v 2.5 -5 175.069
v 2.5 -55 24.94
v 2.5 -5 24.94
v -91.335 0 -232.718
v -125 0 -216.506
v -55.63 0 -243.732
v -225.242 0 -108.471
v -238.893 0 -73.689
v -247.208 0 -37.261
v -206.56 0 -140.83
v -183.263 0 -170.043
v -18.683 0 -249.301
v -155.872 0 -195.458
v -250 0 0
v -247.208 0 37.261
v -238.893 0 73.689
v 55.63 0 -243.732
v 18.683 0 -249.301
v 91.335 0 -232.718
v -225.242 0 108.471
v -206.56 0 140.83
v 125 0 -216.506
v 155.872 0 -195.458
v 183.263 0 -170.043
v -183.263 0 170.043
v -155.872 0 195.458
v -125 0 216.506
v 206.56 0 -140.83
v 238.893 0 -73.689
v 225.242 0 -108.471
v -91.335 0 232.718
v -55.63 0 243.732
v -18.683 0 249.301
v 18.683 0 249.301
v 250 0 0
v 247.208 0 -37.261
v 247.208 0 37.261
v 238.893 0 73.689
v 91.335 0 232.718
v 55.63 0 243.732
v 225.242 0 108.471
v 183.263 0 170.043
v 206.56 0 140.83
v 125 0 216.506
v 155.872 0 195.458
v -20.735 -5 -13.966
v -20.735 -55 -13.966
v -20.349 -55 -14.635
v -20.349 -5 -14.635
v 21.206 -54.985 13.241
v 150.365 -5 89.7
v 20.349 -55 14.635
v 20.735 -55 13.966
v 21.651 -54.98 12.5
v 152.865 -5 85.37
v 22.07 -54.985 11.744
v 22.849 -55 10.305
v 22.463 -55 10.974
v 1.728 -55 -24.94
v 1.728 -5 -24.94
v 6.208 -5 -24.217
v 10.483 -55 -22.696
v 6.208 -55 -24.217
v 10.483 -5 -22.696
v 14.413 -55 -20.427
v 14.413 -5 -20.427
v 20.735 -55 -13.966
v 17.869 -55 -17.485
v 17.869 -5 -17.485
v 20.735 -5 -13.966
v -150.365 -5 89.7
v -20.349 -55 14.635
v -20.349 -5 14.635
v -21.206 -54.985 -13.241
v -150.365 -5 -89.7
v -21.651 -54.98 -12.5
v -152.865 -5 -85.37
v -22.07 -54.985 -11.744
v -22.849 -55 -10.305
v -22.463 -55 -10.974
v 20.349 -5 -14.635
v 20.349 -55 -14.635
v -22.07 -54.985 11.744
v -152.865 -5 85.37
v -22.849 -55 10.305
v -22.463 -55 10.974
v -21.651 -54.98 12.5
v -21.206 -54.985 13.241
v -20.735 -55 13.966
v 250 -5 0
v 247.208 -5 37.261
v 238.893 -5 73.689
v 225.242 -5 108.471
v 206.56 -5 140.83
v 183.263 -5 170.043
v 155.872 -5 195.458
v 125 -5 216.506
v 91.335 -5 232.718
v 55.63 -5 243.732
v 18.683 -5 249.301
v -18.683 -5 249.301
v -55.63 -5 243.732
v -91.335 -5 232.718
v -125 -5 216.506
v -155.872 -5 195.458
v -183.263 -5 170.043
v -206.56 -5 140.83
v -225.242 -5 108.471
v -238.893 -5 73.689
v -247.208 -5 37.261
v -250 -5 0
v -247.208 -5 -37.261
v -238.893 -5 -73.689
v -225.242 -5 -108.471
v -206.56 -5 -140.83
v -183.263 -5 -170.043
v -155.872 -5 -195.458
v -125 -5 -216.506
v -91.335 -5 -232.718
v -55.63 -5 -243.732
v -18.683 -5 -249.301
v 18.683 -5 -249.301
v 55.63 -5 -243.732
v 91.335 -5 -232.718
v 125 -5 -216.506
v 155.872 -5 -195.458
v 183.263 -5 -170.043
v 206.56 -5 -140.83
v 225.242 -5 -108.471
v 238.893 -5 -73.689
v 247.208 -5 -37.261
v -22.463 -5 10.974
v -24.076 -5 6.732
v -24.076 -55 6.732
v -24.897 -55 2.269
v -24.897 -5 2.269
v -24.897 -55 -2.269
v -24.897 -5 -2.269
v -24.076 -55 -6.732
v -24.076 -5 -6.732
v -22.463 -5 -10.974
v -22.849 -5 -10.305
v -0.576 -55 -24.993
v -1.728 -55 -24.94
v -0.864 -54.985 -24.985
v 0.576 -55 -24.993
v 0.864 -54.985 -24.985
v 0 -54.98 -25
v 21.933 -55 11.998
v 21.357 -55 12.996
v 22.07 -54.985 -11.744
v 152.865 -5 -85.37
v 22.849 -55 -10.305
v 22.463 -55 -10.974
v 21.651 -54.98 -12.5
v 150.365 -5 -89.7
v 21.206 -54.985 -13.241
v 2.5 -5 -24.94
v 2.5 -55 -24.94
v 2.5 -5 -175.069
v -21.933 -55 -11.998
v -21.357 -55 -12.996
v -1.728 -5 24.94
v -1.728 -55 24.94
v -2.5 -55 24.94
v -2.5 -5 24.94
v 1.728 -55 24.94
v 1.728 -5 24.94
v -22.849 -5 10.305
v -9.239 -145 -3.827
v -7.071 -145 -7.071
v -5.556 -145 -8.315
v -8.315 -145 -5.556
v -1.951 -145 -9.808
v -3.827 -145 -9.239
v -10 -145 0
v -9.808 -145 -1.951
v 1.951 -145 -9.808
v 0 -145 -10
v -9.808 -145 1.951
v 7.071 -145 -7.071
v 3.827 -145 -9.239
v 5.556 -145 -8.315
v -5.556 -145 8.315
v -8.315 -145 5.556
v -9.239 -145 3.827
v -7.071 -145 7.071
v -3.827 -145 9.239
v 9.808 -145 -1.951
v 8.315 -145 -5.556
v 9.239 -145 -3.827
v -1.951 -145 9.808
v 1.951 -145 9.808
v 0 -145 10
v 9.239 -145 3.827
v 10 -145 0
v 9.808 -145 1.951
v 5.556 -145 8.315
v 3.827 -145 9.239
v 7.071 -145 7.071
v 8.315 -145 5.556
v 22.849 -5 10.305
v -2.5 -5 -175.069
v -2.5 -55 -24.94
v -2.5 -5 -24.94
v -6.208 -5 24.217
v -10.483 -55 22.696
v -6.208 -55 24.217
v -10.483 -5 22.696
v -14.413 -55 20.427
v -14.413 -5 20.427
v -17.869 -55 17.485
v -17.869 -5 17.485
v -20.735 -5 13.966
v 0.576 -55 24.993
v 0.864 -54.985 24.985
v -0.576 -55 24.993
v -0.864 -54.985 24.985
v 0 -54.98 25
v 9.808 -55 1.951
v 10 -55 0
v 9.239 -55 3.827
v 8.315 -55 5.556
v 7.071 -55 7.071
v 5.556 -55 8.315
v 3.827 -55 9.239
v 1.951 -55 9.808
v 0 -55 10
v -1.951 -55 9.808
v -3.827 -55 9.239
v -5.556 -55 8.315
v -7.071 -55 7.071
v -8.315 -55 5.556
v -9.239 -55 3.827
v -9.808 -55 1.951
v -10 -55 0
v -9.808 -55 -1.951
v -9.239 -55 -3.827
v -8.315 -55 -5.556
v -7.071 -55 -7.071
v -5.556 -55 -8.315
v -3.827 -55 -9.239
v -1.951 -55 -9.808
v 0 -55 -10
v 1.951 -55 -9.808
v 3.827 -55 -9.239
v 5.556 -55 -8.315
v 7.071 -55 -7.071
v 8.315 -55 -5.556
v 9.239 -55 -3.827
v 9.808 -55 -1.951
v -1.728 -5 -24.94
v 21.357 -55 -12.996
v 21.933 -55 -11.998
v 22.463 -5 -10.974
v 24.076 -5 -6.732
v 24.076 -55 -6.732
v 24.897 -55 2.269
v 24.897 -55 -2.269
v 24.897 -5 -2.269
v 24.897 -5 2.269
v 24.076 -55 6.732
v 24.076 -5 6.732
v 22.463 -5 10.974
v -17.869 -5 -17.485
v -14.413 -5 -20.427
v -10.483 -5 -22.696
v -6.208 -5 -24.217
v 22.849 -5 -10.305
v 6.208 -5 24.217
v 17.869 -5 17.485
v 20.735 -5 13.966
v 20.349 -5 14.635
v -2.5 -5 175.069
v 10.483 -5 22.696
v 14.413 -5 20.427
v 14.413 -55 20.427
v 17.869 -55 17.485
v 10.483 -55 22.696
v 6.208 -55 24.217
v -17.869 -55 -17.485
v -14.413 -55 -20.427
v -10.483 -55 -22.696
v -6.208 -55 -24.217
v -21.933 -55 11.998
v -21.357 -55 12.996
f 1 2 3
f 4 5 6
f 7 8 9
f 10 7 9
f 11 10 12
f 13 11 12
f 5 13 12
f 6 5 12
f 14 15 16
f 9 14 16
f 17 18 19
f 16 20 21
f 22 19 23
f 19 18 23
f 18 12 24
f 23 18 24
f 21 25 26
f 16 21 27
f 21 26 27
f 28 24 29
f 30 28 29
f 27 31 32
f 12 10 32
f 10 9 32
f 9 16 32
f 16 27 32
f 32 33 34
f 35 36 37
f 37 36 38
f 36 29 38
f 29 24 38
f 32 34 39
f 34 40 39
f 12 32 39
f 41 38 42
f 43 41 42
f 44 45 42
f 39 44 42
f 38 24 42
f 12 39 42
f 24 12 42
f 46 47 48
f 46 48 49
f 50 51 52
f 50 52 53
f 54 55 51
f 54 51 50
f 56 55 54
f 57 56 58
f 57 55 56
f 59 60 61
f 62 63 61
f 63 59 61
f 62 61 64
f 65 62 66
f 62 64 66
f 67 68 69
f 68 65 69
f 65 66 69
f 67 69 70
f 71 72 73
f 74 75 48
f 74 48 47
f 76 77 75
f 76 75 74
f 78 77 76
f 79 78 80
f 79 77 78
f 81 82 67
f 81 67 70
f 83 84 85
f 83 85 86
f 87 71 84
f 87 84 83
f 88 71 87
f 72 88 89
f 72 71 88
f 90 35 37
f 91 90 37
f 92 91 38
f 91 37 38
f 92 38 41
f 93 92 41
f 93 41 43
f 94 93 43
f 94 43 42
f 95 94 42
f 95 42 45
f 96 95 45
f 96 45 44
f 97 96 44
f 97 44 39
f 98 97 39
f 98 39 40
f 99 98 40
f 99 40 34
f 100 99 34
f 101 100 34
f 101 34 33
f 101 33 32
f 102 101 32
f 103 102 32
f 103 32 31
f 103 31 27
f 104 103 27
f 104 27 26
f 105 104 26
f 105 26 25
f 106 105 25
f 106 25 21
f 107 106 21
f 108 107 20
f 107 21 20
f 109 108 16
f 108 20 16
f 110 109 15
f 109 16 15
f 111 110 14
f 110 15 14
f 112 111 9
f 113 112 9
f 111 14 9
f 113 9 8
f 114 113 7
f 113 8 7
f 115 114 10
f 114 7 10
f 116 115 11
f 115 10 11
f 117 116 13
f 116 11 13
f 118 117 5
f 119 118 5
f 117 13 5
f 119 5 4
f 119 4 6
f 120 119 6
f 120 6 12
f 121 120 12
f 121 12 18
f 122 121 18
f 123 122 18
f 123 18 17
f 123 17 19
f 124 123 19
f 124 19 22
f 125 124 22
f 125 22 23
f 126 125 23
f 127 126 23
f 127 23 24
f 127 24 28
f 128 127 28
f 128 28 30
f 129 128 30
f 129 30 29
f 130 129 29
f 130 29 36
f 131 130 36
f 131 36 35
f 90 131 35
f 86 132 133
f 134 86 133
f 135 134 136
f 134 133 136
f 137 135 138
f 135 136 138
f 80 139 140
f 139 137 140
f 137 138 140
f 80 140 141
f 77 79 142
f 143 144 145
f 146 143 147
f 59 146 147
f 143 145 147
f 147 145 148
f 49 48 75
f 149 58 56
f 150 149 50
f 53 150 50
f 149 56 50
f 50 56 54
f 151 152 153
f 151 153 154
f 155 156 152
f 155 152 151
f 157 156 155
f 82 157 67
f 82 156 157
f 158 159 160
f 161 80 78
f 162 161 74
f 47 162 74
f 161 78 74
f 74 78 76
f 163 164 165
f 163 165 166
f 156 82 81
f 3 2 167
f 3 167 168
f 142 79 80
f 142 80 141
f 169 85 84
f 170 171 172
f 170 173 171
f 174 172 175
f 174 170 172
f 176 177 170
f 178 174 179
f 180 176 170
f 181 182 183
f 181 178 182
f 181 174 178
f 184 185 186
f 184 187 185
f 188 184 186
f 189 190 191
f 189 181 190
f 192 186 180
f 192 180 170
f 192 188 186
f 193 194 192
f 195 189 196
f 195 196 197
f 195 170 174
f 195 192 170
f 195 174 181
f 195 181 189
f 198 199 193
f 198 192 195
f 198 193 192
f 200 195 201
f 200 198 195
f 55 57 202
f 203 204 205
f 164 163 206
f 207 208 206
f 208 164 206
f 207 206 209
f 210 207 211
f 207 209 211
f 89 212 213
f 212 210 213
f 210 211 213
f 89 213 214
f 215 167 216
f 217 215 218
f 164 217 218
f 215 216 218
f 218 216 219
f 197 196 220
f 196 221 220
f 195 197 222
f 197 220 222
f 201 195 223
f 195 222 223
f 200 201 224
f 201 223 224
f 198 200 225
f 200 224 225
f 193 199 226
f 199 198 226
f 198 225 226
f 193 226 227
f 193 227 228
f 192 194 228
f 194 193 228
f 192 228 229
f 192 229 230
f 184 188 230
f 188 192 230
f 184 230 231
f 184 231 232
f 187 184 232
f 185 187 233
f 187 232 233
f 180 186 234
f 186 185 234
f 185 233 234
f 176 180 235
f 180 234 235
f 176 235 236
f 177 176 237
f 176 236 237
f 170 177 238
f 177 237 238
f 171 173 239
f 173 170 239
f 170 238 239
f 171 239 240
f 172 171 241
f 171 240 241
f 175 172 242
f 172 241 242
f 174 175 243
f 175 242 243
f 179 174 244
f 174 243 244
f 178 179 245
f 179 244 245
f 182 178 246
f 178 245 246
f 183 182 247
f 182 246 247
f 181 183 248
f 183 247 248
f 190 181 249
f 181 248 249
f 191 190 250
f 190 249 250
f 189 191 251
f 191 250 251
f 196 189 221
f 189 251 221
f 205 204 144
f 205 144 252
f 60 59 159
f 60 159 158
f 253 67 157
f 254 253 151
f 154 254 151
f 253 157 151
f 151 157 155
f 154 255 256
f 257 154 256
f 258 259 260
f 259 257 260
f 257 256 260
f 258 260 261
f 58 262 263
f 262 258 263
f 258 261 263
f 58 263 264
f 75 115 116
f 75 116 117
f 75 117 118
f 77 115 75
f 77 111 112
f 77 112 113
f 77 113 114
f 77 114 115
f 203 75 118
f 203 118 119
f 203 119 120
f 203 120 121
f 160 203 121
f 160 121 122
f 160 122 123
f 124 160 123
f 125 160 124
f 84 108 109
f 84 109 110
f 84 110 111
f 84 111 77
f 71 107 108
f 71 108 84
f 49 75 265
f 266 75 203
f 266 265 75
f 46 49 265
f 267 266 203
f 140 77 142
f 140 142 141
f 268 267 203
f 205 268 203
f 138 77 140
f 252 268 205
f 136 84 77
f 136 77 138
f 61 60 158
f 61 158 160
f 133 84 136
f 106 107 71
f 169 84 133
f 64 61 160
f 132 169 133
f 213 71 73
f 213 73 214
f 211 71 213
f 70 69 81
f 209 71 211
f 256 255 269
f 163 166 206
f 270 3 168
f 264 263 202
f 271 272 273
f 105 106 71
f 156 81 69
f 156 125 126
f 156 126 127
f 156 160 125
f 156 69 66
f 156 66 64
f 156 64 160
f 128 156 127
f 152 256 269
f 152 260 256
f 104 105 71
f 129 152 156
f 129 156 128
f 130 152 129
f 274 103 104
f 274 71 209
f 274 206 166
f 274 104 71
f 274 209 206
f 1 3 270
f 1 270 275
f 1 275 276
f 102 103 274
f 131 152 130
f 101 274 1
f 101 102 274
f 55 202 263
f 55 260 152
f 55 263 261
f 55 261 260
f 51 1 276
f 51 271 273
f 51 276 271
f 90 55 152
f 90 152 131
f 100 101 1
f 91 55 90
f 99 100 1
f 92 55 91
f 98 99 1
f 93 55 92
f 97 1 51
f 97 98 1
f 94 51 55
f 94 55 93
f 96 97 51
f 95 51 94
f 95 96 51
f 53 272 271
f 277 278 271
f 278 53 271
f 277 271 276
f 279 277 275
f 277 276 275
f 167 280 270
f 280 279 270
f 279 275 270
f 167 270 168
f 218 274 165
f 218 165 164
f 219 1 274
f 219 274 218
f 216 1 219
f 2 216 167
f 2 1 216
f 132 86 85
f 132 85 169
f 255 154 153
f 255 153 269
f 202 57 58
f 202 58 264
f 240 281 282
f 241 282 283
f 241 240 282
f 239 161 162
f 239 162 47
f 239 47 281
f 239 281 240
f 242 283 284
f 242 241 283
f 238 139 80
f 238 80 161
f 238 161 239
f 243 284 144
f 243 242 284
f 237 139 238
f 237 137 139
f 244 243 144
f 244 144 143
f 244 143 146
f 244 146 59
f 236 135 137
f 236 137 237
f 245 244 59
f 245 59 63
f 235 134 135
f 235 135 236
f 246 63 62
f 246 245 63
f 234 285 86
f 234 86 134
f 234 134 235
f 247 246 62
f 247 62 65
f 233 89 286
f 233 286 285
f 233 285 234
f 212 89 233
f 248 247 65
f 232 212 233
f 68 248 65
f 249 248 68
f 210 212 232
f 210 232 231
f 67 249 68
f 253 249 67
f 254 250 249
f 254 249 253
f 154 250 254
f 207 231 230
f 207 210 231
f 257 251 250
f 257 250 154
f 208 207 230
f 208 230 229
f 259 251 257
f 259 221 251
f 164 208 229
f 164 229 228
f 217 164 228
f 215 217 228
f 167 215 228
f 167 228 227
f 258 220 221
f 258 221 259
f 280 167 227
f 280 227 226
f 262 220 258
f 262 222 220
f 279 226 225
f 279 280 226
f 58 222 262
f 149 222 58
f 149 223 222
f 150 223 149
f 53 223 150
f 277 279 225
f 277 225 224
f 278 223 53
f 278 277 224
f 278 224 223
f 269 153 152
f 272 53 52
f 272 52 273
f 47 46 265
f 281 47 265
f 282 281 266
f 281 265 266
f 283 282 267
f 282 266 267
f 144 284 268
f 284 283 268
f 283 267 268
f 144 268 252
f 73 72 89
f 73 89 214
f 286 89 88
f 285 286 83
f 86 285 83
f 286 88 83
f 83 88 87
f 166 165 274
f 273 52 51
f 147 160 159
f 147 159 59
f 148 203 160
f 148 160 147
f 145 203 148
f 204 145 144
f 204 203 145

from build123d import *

# Parameters (mm, degrees)
F0_R     = 250
F1_DEPTH = 5
F2_R     = 25
F3_DEPTH = 50
F4_R     = 10
F5_DEPTH = 90
F7_DEPTH = 2.5
F8_COUNT = 6


with BuildPart() as f1:
    # F0 (on Front) → F1 (new body)
    with BuildSketch(Plane.XZ):
        Circle(F0_R)
    extrude(amount=F1_DEPTH)

    # F2 (on face) → F3 (join)
    with BuildSketch(Plane.XZ.offset(5)):
        Circle(F2_R)
    extrude(amount=F3_DEPTH)

    # F4 (on face) → F5 (join)
    with BuildSketch(Plane.XZ.offset(55)):
        Circle(F4_R)
    extrude(amount=F5_DEPTH)

    # F6 (on Right) → F7 (join, symmetric)
    with BuildSketch(Plane.YZ):
        Polygon((-5, 175.0694811344), (-55, 24.9402336776), (-5, 24.9402336776), align=None)
    extrude(amount=F7_DEPTH, both=True)

    # F8: F1 ×6 about axis
    f8_axis = Axis((0, -55, 0), (0, -1, 0))


with BuildPart() as f1_1:
    add(f1.part)
    for i in range(1, F8_COUNT):
        add(f1.part.rotate(f8_axis, i * 360 / F8_COUNT))


solid = f1_1.part
